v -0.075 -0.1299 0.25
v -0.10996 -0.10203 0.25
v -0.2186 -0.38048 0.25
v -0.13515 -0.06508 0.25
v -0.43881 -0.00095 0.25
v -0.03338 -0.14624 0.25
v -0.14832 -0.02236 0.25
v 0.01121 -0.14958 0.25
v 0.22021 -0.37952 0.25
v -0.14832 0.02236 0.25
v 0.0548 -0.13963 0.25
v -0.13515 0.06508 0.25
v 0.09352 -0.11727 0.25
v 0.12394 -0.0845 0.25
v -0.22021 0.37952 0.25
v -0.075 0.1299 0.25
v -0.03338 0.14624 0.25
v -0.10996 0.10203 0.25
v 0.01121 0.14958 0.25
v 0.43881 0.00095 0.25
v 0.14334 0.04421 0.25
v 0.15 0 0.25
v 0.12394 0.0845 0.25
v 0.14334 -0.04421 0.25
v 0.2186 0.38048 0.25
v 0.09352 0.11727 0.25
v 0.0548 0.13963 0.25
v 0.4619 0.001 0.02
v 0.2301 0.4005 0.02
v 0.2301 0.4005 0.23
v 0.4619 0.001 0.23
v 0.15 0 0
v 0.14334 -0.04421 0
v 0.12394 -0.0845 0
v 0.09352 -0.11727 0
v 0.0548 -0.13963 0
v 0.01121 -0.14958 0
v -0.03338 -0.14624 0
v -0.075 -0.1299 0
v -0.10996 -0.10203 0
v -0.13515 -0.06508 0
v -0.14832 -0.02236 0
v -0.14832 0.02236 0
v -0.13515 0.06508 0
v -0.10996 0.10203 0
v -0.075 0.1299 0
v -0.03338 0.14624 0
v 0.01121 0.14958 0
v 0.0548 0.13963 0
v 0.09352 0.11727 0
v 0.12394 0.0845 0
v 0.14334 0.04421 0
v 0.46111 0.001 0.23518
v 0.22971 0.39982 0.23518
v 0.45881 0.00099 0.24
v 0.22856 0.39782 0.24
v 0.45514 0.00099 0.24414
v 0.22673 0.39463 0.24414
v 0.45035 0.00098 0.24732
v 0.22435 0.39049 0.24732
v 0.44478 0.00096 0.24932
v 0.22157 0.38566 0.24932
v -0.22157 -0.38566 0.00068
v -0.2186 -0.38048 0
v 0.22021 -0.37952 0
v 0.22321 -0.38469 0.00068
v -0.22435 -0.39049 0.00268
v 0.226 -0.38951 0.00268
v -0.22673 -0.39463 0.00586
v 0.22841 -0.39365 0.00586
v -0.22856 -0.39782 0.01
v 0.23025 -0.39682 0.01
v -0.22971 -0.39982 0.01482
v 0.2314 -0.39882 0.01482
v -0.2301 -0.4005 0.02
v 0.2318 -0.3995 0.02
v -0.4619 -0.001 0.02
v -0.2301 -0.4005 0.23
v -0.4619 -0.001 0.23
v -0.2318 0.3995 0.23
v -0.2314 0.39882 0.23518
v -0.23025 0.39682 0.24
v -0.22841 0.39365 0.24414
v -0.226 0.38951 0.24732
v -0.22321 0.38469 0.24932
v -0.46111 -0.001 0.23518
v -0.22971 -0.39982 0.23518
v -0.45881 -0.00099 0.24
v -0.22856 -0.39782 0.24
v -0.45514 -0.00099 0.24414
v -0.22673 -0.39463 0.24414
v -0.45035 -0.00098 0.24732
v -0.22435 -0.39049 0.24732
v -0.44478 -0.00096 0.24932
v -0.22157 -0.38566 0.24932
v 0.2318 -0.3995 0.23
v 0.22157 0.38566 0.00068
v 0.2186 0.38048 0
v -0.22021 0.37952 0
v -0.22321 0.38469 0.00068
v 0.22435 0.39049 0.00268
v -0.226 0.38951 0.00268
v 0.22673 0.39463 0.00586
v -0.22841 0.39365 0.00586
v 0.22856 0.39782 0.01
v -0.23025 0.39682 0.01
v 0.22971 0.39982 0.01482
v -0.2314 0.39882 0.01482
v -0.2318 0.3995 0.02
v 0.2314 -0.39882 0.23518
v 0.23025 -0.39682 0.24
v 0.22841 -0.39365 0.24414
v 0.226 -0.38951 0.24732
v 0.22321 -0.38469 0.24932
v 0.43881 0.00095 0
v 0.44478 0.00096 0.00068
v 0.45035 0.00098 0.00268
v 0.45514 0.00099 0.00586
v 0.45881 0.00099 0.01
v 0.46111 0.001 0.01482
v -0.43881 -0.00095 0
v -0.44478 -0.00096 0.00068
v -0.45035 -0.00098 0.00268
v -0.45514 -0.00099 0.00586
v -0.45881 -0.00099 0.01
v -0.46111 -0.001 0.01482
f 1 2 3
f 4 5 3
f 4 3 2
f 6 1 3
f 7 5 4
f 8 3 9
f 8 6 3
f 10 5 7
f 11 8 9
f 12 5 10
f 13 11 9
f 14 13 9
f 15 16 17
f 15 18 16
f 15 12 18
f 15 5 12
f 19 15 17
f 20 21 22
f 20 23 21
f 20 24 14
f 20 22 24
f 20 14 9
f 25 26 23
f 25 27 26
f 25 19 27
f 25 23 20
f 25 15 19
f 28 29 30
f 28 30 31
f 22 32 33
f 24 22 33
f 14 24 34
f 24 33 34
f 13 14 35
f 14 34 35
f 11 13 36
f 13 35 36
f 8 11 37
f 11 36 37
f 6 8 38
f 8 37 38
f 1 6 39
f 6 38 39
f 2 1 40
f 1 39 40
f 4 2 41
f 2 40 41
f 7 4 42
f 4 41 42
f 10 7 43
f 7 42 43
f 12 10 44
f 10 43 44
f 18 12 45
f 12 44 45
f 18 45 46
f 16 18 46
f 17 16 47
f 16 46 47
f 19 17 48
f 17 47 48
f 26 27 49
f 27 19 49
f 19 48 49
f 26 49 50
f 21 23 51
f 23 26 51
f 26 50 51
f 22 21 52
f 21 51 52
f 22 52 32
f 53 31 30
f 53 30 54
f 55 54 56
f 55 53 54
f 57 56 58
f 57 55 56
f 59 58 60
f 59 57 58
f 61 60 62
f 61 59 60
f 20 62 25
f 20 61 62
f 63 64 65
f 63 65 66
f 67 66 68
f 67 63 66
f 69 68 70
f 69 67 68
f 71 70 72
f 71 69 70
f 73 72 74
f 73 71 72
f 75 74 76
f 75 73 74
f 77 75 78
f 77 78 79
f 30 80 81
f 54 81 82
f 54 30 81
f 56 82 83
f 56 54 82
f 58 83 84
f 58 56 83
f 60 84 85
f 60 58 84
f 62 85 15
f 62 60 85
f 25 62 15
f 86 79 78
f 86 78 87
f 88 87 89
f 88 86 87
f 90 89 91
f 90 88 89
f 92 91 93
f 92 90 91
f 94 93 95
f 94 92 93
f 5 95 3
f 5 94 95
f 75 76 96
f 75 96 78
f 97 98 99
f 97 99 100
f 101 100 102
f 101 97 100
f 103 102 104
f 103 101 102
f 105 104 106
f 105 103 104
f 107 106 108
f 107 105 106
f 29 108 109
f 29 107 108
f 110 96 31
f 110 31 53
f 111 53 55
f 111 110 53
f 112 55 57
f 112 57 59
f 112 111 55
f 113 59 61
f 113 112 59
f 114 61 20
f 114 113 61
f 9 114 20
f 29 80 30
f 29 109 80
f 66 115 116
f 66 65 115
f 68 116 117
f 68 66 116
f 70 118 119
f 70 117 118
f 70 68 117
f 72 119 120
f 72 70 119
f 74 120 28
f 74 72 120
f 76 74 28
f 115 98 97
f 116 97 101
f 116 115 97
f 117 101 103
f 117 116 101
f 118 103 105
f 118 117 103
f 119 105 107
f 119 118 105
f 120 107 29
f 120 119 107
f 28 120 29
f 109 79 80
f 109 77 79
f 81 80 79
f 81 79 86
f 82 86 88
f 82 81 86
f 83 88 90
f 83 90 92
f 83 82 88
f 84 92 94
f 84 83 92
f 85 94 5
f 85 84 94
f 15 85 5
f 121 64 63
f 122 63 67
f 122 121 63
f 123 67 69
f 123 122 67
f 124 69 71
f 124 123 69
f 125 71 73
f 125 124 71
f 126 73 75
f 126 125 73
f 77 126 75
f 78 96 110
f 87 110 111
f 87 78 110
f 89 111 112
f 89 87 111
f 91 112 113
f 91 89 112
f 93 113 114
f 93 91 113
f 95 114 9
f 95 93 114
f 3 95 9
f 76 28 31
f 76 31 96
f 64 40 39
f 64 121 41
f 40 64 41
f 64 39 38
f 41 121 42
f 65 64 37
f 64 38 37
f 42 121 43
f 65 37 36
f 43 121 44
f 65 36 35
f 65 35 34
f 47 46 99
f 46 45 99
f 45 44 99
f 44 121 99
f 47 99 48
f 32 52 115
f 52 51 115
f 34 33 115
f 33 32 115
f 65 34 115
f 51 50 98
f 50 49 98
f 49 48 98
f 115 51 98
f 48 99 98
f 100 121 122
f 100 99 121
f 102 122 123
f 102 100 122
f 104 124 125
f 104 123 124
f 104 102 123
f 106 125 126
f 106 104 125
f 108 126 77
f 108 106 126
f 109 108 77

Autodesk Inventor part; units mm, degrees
ref_plane "YZ Plane" through (0, 0, 0) normal (1, 0, 0) x (0, 1, 0)
ref_plane "XZ Plane" through (0, 0, 0) normal (0, 1, 0) x (-1, 0, 0)
ref_plane "XY Plane" through (0, 0, 0) normal (0, 0, 1) x (1, 0, 0)
sketch "Sketch1" plane through (0, 0, 0) normal (0, 0, 1) x (1, 0, 0)
  line L0 (0.2301, 0.4005) -> (0.4619, 0.001)
  line L1 (0.4619, 0.001) -> (0.2318, -0.3995)
  line L2 (0.2318, -0.3995) -> (-0.2301, -0.4005)
  line L3 (-0.2301, -0.4005) -> (-0.4619, -0.001)
  line L4 (-0.4619, -0.001) -> (-0.2318, 0.3995)
  line L5 (-0.2318, 0.3995) -> (0.2301, 0.4005)
  circle A0 centre (0, 0) radius 0.15
  dimension "d0" = 0.8
  dimension "d1" = 0.3
extrude "Extrusion1" add sketch "Sketch1" along normal blind 0.25
fillet "Fillet1" radius 0.02 12 edges at (-0.0009, 0.4, 0.25) (0.346, 0.2008, 0.25) (0.346, 0.2008, 0) (-0.0009, 0.4, 0) (0.3469, -0.1992, 0.25) (0.3469, -0.1992, 0) (0.0009, -0.4, 0) (0.0009, -0.4, 0.25) (-0.346, -0.2008, 0.25) (-0.346, -0.2008, 0) (-0.3469, 0.1992, 0.25) (-0.3469, 0.1992, 0)
thread "Thread1" size "35-282 UNM" class "2B" standard "ANSI Unified Screw Threads" full length
properties part number "Design A Part Challenge"
